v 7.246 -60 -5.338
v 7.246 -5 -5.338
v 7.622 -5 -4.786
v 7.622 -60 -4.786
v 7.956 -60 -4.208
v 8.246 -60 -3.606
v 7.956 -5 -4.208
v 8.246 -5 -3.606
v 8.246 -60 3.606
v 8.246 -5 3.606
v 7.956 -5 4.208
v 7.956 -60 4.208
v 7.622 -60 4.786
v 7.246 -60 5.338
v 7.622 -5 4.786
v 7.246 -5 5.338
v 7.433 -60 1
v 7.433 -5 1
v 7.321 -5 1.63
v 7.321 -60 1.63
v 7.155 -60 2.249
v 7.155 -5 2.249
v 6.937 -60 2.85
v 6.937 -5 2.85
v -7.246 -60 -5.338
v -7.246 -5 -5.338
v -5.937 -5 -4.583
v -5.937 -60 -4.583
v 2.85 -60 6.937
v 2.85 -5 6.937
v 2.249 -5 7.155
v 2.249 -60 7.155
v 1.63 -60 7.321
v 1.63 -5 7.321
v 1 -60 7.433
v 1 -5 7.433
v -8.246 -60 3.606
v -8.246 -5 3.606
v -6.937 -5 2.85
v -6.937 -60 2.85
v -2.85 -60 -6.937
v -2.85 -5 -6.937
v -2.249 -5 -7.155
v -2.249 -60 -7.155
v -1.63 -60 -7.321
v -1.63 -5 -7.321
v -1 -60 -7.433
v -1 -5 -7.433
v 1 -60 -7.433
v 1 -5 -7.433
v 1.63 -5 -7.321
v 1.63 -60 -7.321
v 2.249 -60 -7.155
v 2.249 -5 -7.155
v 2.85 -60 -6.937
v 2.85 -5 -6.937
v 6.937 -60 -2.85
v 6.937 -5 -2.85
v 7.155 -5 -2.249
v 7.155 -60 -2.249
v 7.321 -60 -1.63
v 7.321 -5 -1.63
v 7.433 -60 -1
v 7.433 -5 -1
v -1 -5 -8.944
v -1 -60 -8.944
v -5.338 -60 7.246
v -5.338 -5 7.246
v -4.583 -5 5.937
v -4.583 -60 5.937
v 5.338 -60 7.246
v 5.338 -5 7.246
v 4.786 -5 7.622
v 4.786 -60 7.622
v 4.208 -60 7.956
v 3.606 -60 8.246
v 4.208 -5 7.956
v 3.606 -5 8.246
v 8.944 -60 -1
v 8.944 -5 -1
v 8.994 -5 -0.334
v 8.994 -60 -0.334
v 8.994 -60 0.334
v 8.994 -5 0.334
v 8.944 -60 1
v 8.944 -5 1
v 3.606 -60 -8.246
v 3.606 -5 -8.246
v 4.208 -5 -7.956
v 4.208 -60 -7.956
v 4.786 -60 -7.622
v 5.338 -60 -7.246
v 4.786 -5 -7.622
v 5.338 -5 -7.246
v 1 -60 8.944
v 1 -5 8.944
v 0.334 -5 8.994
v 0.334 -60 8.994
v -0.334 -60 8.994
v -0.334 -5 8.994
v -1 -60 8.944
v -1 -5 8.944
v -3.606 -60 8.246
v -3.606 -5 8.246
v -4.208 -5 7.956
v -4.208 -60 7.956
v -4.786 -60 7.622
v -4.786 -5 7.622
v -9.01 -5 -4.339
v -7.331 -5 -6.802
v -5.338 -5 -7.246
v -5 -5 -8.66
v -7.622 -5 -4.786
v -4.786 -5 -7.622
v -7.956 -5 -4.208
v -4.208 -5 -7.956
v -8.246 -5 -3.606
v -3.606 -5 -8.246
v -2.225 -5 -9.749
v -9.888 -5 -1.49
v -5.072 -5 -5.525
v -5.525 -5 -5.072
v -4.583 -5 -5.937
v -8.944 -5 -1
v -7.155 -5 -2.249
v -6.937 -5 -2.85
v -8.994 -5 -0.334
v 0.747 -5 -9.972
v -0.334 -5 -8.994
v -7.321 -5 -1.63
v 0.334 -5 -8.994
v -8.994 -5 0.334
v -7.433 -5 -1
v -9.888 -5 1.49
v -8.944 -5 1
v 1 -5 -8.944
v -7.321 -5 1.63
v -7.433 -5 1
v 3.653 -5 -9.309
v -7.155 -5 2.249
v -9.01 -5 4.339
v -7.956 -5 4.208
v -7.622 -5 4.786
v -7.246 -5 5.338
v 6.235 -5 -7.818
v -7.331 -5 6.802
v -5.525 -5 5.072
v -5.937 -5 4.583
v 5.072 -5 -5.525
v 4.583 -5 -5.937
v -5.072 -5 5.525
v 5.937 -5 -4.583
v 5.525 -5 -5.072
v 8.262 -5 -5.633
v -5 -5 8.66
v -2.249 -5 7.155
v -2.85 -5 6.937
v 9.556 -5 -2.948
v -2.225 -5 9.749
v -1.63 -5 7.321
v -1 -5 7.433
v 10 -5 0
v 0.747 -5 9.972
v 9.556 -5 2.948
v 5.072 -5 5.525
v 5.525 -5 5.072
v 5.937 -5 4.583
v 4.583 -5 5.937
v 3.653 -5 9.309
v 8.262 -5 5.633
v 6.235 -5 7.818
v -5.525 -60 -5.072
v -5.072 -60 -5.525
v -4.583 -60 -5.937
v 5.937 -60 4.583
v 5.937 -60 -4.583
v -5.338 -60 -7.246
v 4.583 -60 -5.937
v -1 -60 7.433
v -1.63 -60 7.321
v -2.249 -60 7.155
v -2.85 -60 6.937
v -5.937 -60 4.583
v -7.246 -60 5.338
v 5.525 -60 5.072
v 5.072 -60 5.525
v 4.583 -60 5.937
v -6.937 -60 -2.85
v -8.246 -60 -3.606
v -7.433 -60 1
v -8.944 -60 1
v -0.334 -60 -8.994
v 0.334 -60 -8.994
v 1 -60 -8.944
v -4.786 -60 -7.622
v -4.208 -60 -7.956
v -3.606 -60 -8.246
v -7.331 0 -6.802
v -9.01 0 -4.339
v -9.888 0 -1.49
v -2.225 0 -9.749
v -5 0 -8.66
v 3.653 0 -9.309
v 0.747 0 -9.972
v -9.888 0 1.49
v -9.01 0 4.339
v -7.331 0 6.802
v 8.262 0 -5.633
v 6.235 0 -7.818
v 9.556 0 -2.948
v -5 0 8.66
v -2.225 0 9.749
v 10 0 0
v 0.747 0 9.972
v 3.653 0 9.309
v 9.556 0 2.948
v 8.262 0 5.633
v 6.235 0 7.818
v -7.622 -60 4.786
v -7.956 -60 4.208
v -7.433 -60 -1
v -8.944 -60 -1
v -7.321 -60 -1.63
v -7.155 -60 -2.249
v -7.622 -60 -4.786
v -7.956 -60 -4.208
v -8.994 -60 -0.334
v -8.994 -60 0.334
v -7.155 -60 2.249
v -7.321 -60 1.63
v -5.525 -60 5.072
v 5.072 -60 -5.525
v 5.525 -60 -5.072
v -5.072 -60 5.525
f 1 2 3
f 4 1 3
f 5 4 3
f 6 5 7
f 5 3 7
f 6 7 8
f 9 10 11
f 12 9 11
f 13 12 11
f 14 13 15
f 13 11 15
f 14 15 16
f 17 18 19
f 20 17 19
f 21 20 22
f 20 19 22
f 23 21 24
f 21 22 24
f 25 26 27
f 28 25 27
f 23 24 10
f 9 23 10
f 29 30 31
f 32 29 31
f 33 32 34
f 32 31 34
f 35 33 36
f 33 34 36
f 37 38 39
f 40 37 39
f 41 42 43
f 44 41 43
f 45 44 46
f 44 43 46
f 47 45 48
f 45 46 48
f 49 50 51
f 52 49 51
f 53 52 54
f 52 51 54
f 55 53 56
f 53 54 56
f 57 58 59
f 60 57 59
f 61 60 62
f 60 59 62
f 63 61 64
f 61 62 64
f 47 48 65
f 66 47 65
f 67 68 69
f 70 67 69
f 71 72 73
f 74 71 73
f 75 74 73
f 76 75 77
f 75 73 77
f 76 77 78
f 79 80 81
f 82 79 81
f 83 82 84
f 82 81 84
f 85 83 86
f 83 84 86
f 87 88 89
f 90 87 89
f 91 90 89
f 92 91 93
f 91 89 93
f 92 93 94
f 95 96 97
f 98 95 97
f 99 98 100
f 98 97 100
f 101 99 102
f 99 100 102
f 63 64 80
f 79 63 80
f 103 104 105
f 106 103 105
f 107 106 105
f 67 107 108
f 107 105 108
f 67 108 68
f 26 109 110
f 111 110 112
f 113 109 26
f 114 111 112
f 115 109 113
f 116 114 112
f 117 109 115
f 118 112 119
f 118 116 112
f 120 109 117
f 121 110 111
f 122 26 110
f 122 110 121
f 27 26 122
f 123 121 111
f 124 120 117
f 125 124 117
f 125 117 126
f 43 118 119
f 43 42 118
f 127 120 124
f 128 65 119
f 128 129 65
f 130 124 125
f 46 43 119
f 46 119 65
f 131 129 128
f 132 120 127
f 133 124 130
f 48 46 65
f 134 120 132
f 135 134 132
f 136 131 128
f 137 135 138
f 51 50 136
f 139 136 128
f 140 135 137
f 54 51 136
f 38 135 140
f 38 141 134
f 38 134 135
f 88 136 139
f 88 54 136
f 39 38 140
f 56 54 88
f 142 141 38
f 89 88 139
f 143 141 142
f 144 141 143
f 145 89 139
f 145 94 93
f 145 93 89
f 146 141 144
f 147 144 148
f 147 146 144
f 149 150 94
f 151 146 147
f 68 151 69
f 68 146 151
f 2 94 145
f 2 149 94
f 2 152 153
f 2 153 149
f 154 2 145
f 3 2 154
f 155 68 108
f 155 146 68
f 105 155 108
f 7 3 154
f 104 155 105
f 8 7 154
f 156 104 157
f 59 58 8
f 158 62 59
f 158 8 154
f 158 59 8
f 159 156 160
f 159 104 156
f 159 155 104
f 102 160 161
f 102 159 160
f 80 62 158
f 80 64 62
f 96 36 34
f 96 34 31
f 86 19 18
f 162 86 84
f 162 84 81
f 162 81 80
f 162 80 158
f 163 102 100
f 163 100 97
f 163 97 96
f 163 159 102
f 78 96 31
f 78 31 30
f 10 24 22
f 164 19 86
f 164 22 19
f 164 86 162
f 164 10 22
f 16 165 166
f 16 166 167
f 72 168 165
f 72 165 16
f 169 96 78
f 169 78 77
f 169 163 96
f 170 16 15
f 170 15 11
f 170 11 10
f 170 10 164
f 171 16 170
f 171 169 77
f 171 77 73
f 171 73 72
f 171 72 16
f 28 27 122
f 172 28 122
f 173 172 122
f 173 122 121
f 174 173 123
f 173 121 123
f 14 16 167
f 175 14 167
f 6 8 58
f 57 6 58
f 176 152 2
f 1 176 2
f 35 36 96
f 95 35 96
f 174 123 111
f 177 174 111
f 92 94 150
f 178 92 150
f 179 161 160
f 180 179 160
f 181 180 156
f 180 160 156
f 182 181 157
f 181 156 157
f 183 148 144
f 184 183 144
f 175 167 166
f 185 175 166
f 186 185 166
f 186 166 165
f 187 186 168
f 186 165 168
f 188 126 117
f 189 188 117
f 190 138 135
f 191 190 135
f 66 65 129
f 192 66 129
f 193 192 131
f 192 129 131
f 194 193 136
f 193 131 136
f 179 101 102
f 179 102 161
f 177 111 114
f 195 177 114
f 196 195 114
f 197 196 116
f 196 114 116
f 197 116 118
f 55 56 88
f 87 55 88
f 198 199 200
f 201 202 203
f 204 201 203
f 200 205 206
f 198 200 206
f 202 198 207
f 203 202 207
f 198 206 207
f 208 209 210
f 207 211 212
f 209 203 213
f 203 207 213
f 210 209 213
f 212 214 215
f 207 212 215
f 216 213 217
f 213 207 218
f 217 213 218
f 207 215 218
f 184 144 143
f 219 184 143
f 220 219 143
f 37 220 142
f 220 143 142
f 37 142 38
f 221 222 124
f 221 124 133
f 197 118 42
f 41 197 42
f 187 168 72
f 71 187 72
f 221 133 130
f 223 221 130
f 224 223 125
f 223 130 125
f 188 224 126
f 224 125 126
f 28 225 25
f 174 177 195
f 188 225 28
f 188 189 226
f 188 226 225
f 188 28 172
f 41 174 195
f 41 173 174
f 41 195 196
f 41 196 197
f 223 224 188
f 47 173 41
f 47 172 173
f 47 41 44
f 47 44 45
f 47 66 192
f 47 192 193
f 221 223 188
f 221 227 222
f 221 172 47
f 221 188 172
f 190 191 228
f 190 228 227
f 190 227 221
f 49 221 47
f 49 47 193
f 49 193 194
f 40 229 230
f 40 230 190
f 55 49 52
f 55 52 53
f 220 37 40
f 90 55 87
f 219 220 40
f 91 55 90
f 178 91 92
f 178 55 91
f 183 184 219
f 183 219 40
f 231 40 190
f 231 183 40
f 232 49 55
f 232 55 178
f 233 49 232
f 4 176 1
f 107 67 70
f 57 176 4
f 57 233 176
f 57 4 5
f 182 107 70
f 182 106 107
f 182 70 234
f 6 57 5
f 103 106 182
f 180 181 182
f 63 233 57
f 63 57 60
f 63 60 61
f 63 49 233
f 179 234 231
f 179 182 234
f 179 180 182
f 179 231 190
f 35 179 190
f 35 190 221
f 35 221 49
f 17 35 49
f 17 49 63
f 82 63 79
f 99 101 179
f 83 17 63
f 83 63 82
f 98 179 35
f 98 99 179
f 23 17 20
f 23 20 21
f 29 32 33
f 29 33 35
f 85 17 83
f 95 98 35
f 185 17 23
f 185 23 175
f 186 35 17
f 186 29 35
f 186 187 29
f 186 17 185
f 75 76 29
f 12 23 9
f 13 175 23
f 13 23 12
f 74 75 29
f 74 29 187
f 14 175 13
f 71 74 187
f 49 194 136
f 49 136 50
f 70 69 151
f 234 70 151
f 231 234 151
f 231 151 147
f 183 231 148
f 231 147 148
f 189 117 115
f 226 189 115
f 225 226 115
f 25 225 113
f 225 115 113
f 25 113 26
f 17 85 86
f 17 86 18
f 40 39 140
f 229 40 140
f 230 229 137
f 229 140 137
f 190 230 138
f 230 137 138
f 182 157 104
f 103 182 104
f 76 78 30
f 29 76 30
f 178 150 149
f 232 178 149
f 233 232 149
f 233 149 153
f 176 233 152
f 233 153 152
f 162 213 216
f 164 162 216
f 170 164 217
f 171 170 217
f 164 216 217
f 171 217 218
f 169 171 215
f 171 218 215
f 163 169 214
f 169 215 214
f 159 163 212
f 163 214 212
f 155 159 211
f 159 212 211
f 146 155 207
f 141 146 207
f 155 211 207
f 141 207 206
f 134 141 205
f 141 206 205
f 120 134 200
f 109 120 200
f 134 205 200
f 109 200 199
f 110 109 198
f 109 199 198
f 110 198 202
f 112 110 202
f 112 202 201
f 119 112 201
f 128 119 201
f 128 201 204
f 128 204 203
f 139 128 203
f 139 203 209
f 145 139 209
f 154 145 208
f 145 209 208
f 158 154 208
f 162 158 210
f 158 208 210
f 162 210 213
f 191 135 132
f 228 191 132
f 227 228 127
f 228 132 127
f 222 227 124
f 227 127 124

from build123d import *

# Parameters (mm, degrees)
F1_DEPTH = 60
F0_R     = 10
F2_DEPTH = 5


with BuildPart() as f1:
    # F0 (on Front) → F1 (new body)
    with BuildSketch(Plane.XZ):
        with BuildLine():
            Line((1, 7.433034), (1, 8.944272))
            ThreePointArc((1, 8.944272), (0, 9), (-1, 8.944272))
            Line((-1, 8.944272), (-1, 7.433034))
            ThreePointArc((-1, 7.433034), (0, 7.5), (1, 7.433034))
        make_face()
        with BuildLine():
            Line((3.606111, 8.245967), (2.850492, 6.937197))
            ThreePointArc((2.850492, 6.937197), (3.75, 6.495191), (4.582543, 5.937197))
            Line((4.582543, 5.937197), (5.338161, 7.245967))
            ThreePointArc((5.338161, 7.245967), (4.5, 7.794229), (3.606111, 8.245967))
        make_face()
        with BuildLine():
            Line((7.245967, 5.338161), (5.937197, 4.582543))
            ThreePointArc((5.937197, 4.582543), (6.495191, 3.75), (6.937197, 2.850492))
            Line((6.937197, 2.850492), (8.245967, 3.606111))
            ThreePointArc((8.245967, 3.606111), (7.794229, 4.5), (7.245967, 5.338161))
        make_face()
        with BuildLine():
            Line((8.944272, 1), (7.433034, 1))
            ThreePointArc((7.433034, 1), (7.48324, 0.50112), (7.5, 0))
            ThreePointArc((7.5, 0), (7.48324, -0.50112), (7.433034, -1))
            Line((7.433034, -1), (8.944272, -1))
            ThreePointArc((8.944272, -1), (9, 0), (8.944272, 1))
        make_face()
        with BuildLine():
            Line((8.245967, -3.606111), (6.937197, -2.850492))
            ThreePointArc((6.937197, -2.850492), (6.495191, -3.75), (5.937197, -4.582543))
            Line((5.937197, -4.582543), (7.245967, -5.338161))
            ThreePointArc((7.245967, -5.338161), (7.794229, -4.5), (8.245967, -3.606111))
        make_face()
        with BuildLine():
            Line((5.338161, -7.245967), (4.582543, -5.937197))
            ThreePointArc((4.582543, -5.937197), (3.75, -6.495191), (2.850492, -6.937197))
            Line((2.850492, -6.937197), (3.606111, -8.245967))
            ThreePointArc((3.606111, -8.245967), (4.5, -7.794229), (5.338161, -7.245967))
        make_face()
        with BuildLine():
            ThreePointArc((1, -7.433034), (0, -7.5), (-1, -7.433034))
            Line((-1, -7.433034), (-1, -8.944272))
            ThreePointArc((-1, -8.944272), (0, -9), (1, -8.944272))
            Line((1, -8.944272), (1, -7.433034))
        make_face()
        with BuildLine():
            ThreePointArc((-2.850492, -6.937197), (-3.75, -6.495191), (-4.582543, -5.937197))
            Line((-4.582543, -5.937197), (-5.338161, -7.245967))
            ThreePointArc((-5.338161, -7.245967), (-4.5, -7.794229), (-3.606111, -8.245967))
            Line((-3.606111, -8.245967), (-2.850492, -6.937197))
        make_face()
        with BuildLine():
            ThreePointArc((-5.937197, -4.582543), (-6.495191, -3.75), (-6.937197, -2.850492))
            Line((-6.937197, -2.850492), (-8.245967, -3.606111))
            ThreePointArc((-8.245967, -3.606111), (-7.794229, -4.5), (-7.245967, -5.338161))
            Line((-7.245967, -5.338161), (-5.937197, -4.582543))
        make_face()
        with BuildLine():
            ThreePointArc((-7.433034, -1), (-7.5, 0), (-7.433034, 1))
            Line((-7.433034, 1), (-8.944272, 1))
            ThreePointArc((-8.944272, 1), (-9, 0), (-8.944272, -1))
            Line((-8.944272, -1), (-7.433034, -1))
        make_face()
        with BuildLine():
            ThreePointArc((-6.937197, 2.850492), (-6.495191, 3.75), (-5.937197, 4.582543))
            Line((-5.937197, 4.582543), (-7.245967, 5.338161))
            ThreePointArc((-7.245967, 5.338161), (-7.794229, 4.5), (-8.245967, 3.606111))
            Line((-8.245967, 3.606111), (-6.937197, 2.850492))
        make_face()
        with BuildLine():
            ThreePointArc((-4.582543, 5.937197), (-3.75, 6.495191), (-2.850492, 6.937197))
            Line((-2.850492, 6.937197), (-3.606111, 8.245967))
            ThreePointArc((-3.606111, 8.245967), (-4.5, 7.794229), (-5.338161, 7.245967))
            Line((-5.338161, 7.245967), (-4.582543, 5.937197))
        make_face()
        with BuildLine():
            ThreePointArc((2.850492, 6.937197), (1.941143, 7.244444), (1, 7.433034))
            ThreePointArc((1, 7.433034), (0, 7.5), (-1, 7.433034))
            ThreePointArc((-1, 7.433034), (-1.941143, 7.244444), (-2.850492, 6.937197))
            ThreePointArc((-2.850492, 6.937197), (-3.75, 6.495191), (-4.582543, 5.937197))
            ThreePointArc((-4.582543, 5.937197), (-5.303301, 5.303301), (-5.937197, 4.582543))
            ThreePointArc((-5.937197, 4.582543), (-6.495191, 3.75), (-6.937197, 2.850492))
            ThreePointArc((-6.937197, 2.850492), (-7.244444, 1.941143), (-7.433034, 1))
            ThreePointArc((-7.433034, 1), (-7.5, 0), (-7.433034, -1))
            ThreePointArc((-7.433034, -1), (-7.244444, -1.941143), (-6.937197, -2.850492))
            ThreePointArc((-6.937197, -2.850492), (-6.495191, -3.75), (-5.937197, -4.582543))
            ThreePointArc((-5.937197, -4.582543), (-5.303301, -5.303301), (-4.582543, -5.937197))
            ThreePointArc((-4.582543, -5.937197), (-3.75, -6.495191), (-2.850492, -6.937197))
            ThreePointArc((-2.850492, -6.937197), (-1.941143, -7.244444), (-1, -7.433034))
            ThreePointArc((-1, -7.433034), (0, -7.5), (1, -7.433034))
            ThreePointArc((1, -7.433034), (1.941143, -7.244444), (2.850492, -6.937197))
            ThreePointArc((2.850492, -6.937197), (3.75, -6.495191), (4.582543, -5.937197))
            ThreePointArc((4.582543, -5.937197), (5.303301, -5.303301), (5.937197, -4.582543))
            ThreePointArc((5.937197, -4.582543), (6.495191, -3.75), (6.937197, -2.850492))
            ThreePointArc((6.937197, -2.850492), (7.244444, -1.941143), (7.433034, -1))
            ThreePointArc((7.433034, -1), (7.48324, -0.50112), (7.5, 0))
            ThreePointArc((7.5, 0), (7.48324, 0.50112), (7.433034, 1))
            ThreePointArc((7.433034, 1), (7.244444, 1.941143), (6.937197, 2.850492))
            ThreePointArc((6.937197, 2.850492), (6.495191, 3.75), (5.937197, 4.582543))
            ThreePointArc((5.937197, 4.582543), (5.303301, 5.303301), (4.582543, 5.937197))
            ThreePointArc((4.582543, 5.937197), (3.75, 6.495191), (2.850492, 6.937197))
        make_face()
    extrude(amount=F1_DEPTH)

    # F0 (on Front) → F2 (join)
    with BuildSketch(Plane.XZ):
        Circle(F0_R)
        with BuildLine():
            ThreePointArc((-1, 8.944272), (0, 9), (1, 8.944272))
            Line((1, 8.944272), (1, 7.433034))
            ThreePointArc((1, 7.433034), (1.941143, 7.244444), (2.850492, 6.937197))
            Line((2.850492, 6.937197), (3.606111, 8.245967))
            ThreePointArc((3.606111, 8.245967), (4.5, 7.794229), (5.338161, 7.245967))
            Line((5.338161, 7.245967), (4.582543, 5.937197))
            ThreePointArc((4.582543, 5.937197), (5.303301, 5.303301), (5.937197, 4.582543))
            Line((5.937197, 4.582543), (7.245967, 5.338161))
            ThreePointArc((7.245967, 5.338161), (7.794229, 4.5), (8.245967, 3.606111))
            Line((8.245967, 3.606111), (6.937197, 2.850492))
            ThreePointArc((6.937197, 2.850492), (7.244444, 1.941143), (7.433034, 1))
            Line((7.433034, 1), (8.944272, 1))
            ThreePointArc((8.944272, 1), (9, 0), (8.944272, -1))
            Line((8.944272, -1), (7.433034, -1))
            ThreePointArc((7.433034, -1), (7.244444, -1.941143), (6.937197, -2.850492))
            Line((6.937197, -2.850492), (8.245967, -3.606111))
            ThreePointArc((8.245967, -3.606111), (7.794229, -4.5), (7.245967, -5.338161))
            Line((7.245967, -5.338161), (5.937197, -4.582543))
            ThreePointArc((5.937197, -4.582543), (5.303301, -5.303301), (4.582543, -5.937197))
            Line((4.582543, -5.937197), (5.338161, -7.245967))
            ThreePointArc((5.338161, -7.245967), (4.5, -7.794229), (3.606111, -8.245967))
            Line((3.606111, -8.245967), (2.850492, -6.937197))
            ThreePointArc((2.850492, -6.937197), (1.941143, -7.244444), (1, -7.433034))
            Line((1, -7.433034), (1, -8.944272))
            ThreePointArc((1, -8.944272), (0, -9), (-1, -8.944272))
            Line((-1, -8.944272), (-1, -7.433034))
            ThreePointArc((-1, -7.433034), (-1.941143, -7.244444), (-2.850492, -6.937197))
            Line((-2.850492, -6.937197), (-3.606111, -8.245967))
            ThreePointArc((-3.606111, -8.245967), (-4.5, -7.794229), (-5.338161, -7.245967))
            Line((-5.338161, -7.245967), (-4.582543, -5.937197))
            ThreePointArc((-4.582543, -5.937197), (-5.303301, -5.303301), (-5.937197, -4.582543))
            Line((-5.937197, -4.582543), (-7.245967, -5.338161))
            ThreePointArc((-7.245967, -5.338161), (-7.794229, -4.5), (-8.245967, -3.606111))
            Line((-8.245967, -3.606111), (-6.937197, -2.850492))
            ThreePointArc((-6.937197, -2.850492), (-7.244444, -1.941143), (-7.433034, -1))
            Line((-7.433034, -1), (-8.944272, -1))
            ThreePointArc((-8.944272, -1), (-9, 0), (-8.944272, 1))
            Line((-8.944272, 1), (-7.433034, 1))
            ThreePointArc((-7.433034, 1), (-7.244444, 1.941143), (-6.937197, 2.850492))
            Line((-6.937197, 2.850492), (-8.245967, 3.606111))
            ThreePointArc((-8.245967, 3.606111), (-7.794229, 4.5), (-7.245967, 5.338161))
            Line((-7.245967, 5.338161), (-5.937197, 4.582543))
            ThreePointArc((-5.937197, 4.582543), (-5.303301, 5.303301), (-4.582543, 5.937197))
            Line((-4.582543, 5.937197), (-5.338161, 7.245967))
            ThreePointArc((-5.338161, 7.245967), (-4.5, 7.794229), (-3.606111, 8.245967))
            Line((-3.606111, 8.245967), (-2.850492, 6.937197))
            ThreePointArc((-2.850492, 6.937197), (-1.941143, 7.244444), (-1, 7.433034))
            Line((-1, 7.433034), (-1, 8.944272))
        make_face(mode=Mode.SUBTRACT)
        with BuildLine():
            ThreePointArc((2.850492, 6.937197), (1.941143, 7.244444), (1, 7.433034))
            ThreePointArc((1, 7.433034), (0, 7.5), (-1, 7.433034))
            ThreePointArc((-1, 7.433034), (-1.941143, 7.244444), (-2.850492, 6.937197))
            ThreePointArc((-2.850492, 6.937197), (-3.75, 6.495191), (-4.582543, 5.937197))
            ThreePointArc((-4.582543, 5.937197), (-5.303301, 5.303301), (-5.937197, 4.582543))
            ThreePointArc((-5.937197, 4.582543), (-6.495191, 3.75), (-6.937197, 2.850492))
            ThreePointArc((-6.937197, 2.850492), (-7.244444, 1.941143), (-7.433034, 1))
            ThreePointArc((-7.433034, 1), (-7.5, 0), (-7.433034, -1))
            ThreePointArc((-7.433034, -1), (-7.244444, -1.941143), (-6.937197, -2.850492))
            ThreePointArc((-6.937197, -2.850492), (-6.495191, -3.75), (-5.937197, -4.582543))
            ThreePointArc((-5.937197, -4.582543), (-5.303301, -5.303301), (-4.582543, -5.937197))
            ThreePointArc((-4.582543, -5.937197), (-3.75, -6.495191), (-2.850492, -6.937197))
            ThreePointArc((-2.850492, -6.937197), (-1.941143, -7.244444), (-1, -7.433034))
            ThreePointArc((-1, -7.433034), (0, -7.5), (1, -7.433034))
            ThreePointArc((1, -7.433034), (1.941143, -7.244444), (2.850492, -6.937197))
            ThreePointArc((2.850492, -6.937197), (3.75, -6.495191), (4.582543, -5.937197))
            ThreePointArc((4.582543, -5.937197), (5.303301, -5.303301), (5.937197, -4.582543))
            ThreePointArc((5.937197, -4.582543), (6.495191, -3.75), (6.937197, -2.850492))
            ThreePointArc((6.937197, -2.850492), (7.244444, -1.941143), (7.433034, -1))
            ThreePointArc((7.433034, -1), (7.48324, -0.50112), (7.5, 0))
            ThreePointArc((7.5, 0), (7.48324, 0.50112), (7.433034, 1))
            ThreePointArc((7.433034, 1), (7.244444, 1.941143), (6.937197, 2.850492))
            ThreePointArc((6.937197, 2.850492), (6.495191, 3.75), (5.937197, 4.582543))
            ThreePointArc((5.937197, 4.582543), (5.303301, 5.303301), (4.582543, 5.937197))
            ThreePointArc((4.582543, 5.937197), (3.75, 6.495191), (2.850492, 6.937197))
        make_face()
        with BuildLine():
            ThreePointArc((1, -7.433034), (0, -7.5), (-1, -7.433034))
            Line((-1, -7.433034), (-1, -8.944272))
            ThreePointArc((-1, -8.944272), (0, -9), (1, -8.944272))
            Line((1, -8.944272), (1, -7.433034))
        make_face()
        with BuildLine():
            Line((5.338161, -7.245967), (4.582543, -5.937197))
            ThreePointArc((4.582543, -5.937197), (3.75, -6.495191), (2.850492, -6.937197))
            Line((2.850492, -6.937197), (3.606111, -8.245967))
            ThreePointArc((3.606111, -8.245967), (4.5, -7.794229), (5.338161, -7.245967))
        make_face()
        with BuildLine():
            Line((8.245967, -3.606111), (6.937197, -2.850492))
            ThreePointArc((6.937197, -2.850492), (6.495191, -3.75), (5.937197, -4.582543))
            Line((5.937197, -4.582543), (7.245967, -5.338161))
            ThreePointArc((7.245967, -5.338161), (7.794229, -4.5), (8.245967, -3.606111))
        make_face()
        with BuildLine():
            Line((8.944272, 1), (7.433034, 1))
            ThreePointArc((7.433034, 1), (7.48324, 0.50112), (7.5, 0))
            ThreePointArc((7.5, 0), (7.48324, -0.50112), (7.433034, -1))
            Line((7.433034, -1), (8.944272, -1))
            ThreePointArc((8.944272, -1), (9, 0), (8.944272, 1))
        make_face()
        with BuildLine():
            Line((7.245967, 5.338161), (5.937197, 4.582543))
            ThreePointArc((5.937197, 4.582543), (6.495191, 3.75), (6.937197, 2.850492))
            Line((6.937197, 2.850492), (8.245967, 3.606111))
            ThreePointArc((8.245967, 3.606111), (7.794229, 4.5), (7.245967, 5.338161))
        make_face()
        with BuildLine():
            Line((3.606111, 8.245967), (2.850492, 6.937197))
            ThreePointArc((2.850492, 6.937197), (3.75, 6.495191), (4.582543, 5.937197))
            Line((4.582543, 5.937197), (5.338161, 7.245967))
            ThreePointArc((5.338161, 7.245967), (4.5, 7.794229), (3.606111, 8.245967))
        make_face()
        with BuildLine():
            Line((1, 7.433034), (1, 8.944272))
            ThreePointArc((1, 8.944272), (0, 9), (-1, 8.944272))
            Line((-1, 8.944272), (-1, 7.433034))
            ThreePointArc((-1, 7.433034), (0, 7.5), (1, 7.433034))
        make_face()
        with BuildLine():
            ThreePointArc((-4.582543, 5.937197), (-3.75, 6.495191), (-2.850492, 6.937197))
            Line((-2.850492, 6.937197), (-3.606111, 8.245967))
            ThreePointArc((-3.606111, 8.245967), (-4.5, 7.794229), (-5.338161, 7.245967))
            Line((-5.338161, 7.245967), (-4.582543, 5.937197))
        make_face()
        with BuildLine():
            ThreePointArc((-6.937197, 2.850492), (-6.495191, 3.75), (-5.937197, 4.582543))
            Line((-5.937197, 4.582543), (-7.245967, 5.338161))
            ThreePointArc((-7.245967, 5.338161), (-7.794229, 4.5), (-8.245967, 3.606111))
            Line((-8.245967, 3.606111), (-6.937197, 2.850492))
        make_face()
        with BuildLine():
            ThreePointArc((-7.433034, -1), (-7.5, 0), (-7.433034, 1))
            Line((-7.433034, 1), (-8.944272, 1))
            ThreePointArc((-8.944272, 1), (-9, 0), (-8.944272, -1))
            Line((-8.944272, -1), (-7.433034, -1))
        make_face()
        with BuildLine():
            ThreePointArc((-5.937197, -4.582543), (-6.495191, -3.75), (-6.937197, -2.850492))
            Line((-6.937197, -2.850492), (-8.245967, -3.606111))
            ThreePointArc((-8.245967, -3.606111), (-7.794229, -4.5), (-7.245967, -5.338161))
            Line((-7.245967, -5.338161), (-5.937197, -4.582543))
        make_face()
        with BuildLine():
            ThreePointArc((-2.850492, -6.937197), (-3.75, -6.495191), (-4.582543, -5.937197))
            Line((-4.582543, -5.937197), (-5.338161, -7.245967))
            ThreePointArc((-5.338161, -7.245967), (-4.5, -7.794229), (-3.606111, -8.245967))
            Line((-3.606111, -8.245967), (-2.850492, -6.937197))
        make_face()
    extrude(amount=F2_DEPTH)


solid = f1.part
